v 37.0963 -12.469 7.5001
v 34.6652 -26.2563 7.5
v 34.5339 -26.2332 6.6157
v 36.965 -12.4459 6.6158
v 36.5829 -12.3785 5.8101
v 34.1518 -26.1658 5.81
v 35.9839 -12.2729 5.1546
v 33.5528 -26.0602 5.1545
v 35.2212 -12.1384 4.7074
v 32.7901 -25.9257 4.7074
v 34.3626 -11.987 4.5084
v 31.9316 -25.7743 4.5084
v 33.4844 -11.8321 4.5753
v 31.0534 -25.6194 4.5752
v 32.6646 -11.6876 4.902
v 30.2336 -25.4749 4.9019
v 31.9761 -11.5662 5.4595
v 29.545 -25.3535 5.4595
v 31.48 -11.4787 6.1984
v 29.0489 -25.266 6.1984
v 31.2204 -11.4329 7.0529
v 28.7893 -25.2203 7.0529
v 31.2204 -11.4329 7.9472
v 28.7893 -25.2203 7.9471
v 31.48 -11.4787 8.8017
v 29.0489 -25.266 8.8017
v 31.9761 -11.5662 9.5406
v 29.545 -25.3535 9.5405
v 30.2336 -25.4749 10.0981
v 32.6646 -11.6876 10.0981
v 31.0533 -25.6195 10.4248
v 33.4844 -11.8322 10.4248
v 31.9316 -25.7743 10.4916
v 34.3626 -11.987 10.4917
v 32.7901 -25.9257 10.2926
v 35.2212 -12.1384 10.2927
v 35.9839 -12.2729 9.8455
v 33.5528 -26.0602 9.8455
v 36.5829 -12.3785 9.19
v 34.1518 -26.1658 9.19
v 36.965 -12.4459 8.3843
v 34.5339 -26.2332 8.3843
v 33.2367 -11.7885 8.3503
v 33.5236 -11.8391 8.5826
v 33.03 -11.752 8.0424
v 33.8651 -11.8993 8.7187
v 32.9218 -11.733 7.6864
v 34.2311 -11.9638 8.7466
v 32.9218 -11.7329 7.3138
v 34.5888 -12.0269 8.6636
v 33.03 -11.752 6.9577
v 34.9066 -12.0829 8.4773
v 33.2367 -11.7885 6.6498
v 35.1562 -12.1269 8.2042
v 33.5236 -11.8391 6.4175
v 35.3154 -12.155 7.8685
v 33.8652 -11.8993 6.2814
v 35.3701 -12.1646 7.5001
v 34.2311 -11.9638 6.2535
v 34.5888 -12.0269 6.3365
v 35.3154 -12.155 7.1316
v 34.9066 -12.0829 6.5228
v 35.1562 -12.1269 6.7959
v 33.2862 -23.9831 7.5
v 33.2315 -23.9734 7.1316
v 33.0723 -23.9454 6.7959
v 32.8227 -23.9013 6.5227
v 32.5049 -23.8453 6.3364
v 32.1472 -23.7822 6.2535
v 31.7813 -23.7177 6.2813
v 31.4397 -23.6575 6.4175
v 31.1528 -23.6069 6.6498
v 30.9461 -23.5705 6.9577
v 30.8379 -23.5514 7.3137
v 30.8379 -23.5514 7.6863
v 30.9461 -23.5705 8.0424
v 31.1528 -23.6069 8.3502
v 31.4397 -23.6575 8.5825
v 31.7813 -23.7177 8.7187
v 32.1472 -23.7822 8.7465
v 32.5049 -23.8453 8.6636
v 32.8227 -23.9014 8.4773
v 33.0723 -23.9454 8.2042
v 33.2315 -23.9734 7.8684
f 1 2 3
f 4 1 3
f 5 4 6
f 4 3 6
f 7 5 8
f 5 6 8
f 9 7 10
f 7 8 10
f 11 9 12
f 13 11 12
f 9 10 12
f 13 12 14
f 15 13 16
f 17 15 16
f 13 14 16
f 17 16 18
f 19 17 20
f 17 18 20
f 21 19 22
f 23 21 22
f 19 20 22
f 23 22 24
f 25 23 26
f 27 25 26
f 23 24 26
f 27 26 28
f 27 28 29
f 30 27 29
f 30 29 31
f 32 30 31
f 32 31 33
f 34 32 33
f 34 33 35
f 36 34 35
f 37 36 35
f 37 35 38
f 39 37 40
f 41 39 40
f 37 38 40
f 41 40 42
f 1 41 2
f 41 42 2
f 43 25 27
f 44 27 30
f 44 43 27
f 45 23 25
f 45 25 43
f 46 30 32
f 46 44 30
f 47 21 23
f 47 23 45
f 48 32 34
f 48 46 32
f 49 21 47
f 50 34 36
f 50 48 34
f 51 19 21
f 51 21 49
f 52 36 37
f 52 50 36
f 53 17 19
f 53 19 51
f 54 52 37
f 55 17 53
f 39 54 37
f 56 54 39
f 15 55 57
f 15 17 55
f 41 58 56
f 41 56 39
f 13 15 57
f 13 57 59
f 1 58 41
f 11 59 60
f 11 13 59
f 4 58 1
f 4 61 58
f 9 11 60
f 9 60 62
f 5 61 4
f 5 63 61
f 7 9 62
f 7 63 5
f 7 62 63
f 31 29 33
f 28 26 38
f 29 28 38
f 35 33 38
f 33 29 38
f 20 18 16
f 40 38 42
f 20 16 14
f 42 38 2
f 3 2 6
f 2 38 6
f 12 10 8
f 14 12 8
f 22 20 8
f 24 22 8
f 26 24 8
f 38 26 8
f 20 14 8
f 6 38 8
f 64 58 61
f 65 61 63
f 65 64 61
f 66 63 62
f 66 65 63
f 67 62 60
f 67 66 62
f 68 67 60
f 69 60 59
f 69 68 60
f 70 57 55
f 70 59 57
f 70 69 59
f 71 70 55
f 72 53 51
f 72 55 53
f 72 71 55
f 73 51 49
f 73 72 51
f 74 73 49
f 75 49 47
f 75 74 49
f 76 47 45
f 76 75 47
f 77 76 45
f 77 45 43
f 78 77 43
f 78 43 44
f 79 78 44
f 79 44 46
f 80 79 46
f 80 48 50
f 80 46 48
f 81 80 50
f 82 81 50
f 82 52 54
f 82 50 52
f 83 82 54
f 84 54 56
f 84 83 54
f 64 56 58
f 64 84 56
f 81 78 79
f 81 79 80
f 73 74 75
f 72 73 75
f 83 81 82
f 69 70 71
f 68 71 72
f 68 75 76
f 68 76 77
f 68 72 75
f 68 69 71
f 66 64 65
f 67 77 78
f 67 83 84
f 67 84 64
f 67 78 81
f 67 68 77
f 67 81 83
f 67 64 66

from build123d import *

# Parameters (mm, degrees)
CYLINDER038_R               = 1.25
CYLINDER038_DEPTH           = 14
CYLINDER038_ROLL_ANGLE      = -89.999776
CYLINDER038_PITCH_ANGLE     = 1.4e-05
CYLINDER038_PLACEMENT_ANGLE = -9.999925
CYLINDER027_R               = 3
CYLINDER027_DEPTH           = 14
CYLINDER027_ROLL_ANGLE      = -89.999776
CYLINDER027_PITCH_ANGLE     = 1.4e-05
CYLINDER027_PLACEMENT_ANGLE = -9.999925


with BuildPart() as cylinder038:
    # Cylinder038 → Cylinder038 (new body)
    with BuildSketch(Plane.XY):
        Circle(CYLINDER038_R)
    extrude(amount=CYLINDER038_DEPTH)


with BuildPart() as cylinder038_1:
    # Cylinder038 roll: moved
    add(cylinder038.part.rotate(Axis((0, 0, 0), (1, 0, 0)), CYLINDER038_ROLL_ANGLE))


with BuildPart() as cylinder038_2:
    # Cylinder038 pitch: moved
    add(cylinder038_1.part.rotate(Axis((0, 0, 0), (0, 1, 0)), CYLINDER038_PITCH_ANGLE))


with BuildPart() as cylinder038_3:
    # Cylinder038 placement: moved
    add(cylinder038_2.part.moved(Location((32.055183, -23.766017, 7.500006))).rotate(Axis((32.055183, -23.766017, 7.500006), (0, 0, 1)), CYLINDER038_PLACEMENT_ANGLE))


with BuildPart() as cut032:
    # Cylinder027 → Cylinder027 (new body)
    with BuildSketch(Plane.XY):
        Circle(CYLINDER027_R)
    extrude(amount=CYLINDER027_DEPTH)


with BuildPart() as cut032_1:
    # Cylinder027 roll: moved
    add(cut032.part.rotate(Axis((0, 0, 0), (1, 0, 0)), CYLINDER027_ROLL_ANGLE))


with BuildPart() as cut032_2:
    # Cylinder027 pitch: moved
    add(cut032_1.part.rotate(Axis((0, 0, 0), (0, 1, 0)), CYLINDER027_PITCH_ANGLE))


with BuildPart() as cut032_3:
    # Cylinder027 placement: moved
    add(cut032_2.part.moved(Location((31.710772, -25.735381, 7.500001))).rotate(Axis((31.710772, -25.735381, 7.500001), (0, 0, 1)), CYLINDER027_PLACEMENT_ANGLE))

    # Cut032: cut Cylinder038
    add(cylinder038_3.part, mode=Mode.SUBTRACT)


solid = cut032_3.part
